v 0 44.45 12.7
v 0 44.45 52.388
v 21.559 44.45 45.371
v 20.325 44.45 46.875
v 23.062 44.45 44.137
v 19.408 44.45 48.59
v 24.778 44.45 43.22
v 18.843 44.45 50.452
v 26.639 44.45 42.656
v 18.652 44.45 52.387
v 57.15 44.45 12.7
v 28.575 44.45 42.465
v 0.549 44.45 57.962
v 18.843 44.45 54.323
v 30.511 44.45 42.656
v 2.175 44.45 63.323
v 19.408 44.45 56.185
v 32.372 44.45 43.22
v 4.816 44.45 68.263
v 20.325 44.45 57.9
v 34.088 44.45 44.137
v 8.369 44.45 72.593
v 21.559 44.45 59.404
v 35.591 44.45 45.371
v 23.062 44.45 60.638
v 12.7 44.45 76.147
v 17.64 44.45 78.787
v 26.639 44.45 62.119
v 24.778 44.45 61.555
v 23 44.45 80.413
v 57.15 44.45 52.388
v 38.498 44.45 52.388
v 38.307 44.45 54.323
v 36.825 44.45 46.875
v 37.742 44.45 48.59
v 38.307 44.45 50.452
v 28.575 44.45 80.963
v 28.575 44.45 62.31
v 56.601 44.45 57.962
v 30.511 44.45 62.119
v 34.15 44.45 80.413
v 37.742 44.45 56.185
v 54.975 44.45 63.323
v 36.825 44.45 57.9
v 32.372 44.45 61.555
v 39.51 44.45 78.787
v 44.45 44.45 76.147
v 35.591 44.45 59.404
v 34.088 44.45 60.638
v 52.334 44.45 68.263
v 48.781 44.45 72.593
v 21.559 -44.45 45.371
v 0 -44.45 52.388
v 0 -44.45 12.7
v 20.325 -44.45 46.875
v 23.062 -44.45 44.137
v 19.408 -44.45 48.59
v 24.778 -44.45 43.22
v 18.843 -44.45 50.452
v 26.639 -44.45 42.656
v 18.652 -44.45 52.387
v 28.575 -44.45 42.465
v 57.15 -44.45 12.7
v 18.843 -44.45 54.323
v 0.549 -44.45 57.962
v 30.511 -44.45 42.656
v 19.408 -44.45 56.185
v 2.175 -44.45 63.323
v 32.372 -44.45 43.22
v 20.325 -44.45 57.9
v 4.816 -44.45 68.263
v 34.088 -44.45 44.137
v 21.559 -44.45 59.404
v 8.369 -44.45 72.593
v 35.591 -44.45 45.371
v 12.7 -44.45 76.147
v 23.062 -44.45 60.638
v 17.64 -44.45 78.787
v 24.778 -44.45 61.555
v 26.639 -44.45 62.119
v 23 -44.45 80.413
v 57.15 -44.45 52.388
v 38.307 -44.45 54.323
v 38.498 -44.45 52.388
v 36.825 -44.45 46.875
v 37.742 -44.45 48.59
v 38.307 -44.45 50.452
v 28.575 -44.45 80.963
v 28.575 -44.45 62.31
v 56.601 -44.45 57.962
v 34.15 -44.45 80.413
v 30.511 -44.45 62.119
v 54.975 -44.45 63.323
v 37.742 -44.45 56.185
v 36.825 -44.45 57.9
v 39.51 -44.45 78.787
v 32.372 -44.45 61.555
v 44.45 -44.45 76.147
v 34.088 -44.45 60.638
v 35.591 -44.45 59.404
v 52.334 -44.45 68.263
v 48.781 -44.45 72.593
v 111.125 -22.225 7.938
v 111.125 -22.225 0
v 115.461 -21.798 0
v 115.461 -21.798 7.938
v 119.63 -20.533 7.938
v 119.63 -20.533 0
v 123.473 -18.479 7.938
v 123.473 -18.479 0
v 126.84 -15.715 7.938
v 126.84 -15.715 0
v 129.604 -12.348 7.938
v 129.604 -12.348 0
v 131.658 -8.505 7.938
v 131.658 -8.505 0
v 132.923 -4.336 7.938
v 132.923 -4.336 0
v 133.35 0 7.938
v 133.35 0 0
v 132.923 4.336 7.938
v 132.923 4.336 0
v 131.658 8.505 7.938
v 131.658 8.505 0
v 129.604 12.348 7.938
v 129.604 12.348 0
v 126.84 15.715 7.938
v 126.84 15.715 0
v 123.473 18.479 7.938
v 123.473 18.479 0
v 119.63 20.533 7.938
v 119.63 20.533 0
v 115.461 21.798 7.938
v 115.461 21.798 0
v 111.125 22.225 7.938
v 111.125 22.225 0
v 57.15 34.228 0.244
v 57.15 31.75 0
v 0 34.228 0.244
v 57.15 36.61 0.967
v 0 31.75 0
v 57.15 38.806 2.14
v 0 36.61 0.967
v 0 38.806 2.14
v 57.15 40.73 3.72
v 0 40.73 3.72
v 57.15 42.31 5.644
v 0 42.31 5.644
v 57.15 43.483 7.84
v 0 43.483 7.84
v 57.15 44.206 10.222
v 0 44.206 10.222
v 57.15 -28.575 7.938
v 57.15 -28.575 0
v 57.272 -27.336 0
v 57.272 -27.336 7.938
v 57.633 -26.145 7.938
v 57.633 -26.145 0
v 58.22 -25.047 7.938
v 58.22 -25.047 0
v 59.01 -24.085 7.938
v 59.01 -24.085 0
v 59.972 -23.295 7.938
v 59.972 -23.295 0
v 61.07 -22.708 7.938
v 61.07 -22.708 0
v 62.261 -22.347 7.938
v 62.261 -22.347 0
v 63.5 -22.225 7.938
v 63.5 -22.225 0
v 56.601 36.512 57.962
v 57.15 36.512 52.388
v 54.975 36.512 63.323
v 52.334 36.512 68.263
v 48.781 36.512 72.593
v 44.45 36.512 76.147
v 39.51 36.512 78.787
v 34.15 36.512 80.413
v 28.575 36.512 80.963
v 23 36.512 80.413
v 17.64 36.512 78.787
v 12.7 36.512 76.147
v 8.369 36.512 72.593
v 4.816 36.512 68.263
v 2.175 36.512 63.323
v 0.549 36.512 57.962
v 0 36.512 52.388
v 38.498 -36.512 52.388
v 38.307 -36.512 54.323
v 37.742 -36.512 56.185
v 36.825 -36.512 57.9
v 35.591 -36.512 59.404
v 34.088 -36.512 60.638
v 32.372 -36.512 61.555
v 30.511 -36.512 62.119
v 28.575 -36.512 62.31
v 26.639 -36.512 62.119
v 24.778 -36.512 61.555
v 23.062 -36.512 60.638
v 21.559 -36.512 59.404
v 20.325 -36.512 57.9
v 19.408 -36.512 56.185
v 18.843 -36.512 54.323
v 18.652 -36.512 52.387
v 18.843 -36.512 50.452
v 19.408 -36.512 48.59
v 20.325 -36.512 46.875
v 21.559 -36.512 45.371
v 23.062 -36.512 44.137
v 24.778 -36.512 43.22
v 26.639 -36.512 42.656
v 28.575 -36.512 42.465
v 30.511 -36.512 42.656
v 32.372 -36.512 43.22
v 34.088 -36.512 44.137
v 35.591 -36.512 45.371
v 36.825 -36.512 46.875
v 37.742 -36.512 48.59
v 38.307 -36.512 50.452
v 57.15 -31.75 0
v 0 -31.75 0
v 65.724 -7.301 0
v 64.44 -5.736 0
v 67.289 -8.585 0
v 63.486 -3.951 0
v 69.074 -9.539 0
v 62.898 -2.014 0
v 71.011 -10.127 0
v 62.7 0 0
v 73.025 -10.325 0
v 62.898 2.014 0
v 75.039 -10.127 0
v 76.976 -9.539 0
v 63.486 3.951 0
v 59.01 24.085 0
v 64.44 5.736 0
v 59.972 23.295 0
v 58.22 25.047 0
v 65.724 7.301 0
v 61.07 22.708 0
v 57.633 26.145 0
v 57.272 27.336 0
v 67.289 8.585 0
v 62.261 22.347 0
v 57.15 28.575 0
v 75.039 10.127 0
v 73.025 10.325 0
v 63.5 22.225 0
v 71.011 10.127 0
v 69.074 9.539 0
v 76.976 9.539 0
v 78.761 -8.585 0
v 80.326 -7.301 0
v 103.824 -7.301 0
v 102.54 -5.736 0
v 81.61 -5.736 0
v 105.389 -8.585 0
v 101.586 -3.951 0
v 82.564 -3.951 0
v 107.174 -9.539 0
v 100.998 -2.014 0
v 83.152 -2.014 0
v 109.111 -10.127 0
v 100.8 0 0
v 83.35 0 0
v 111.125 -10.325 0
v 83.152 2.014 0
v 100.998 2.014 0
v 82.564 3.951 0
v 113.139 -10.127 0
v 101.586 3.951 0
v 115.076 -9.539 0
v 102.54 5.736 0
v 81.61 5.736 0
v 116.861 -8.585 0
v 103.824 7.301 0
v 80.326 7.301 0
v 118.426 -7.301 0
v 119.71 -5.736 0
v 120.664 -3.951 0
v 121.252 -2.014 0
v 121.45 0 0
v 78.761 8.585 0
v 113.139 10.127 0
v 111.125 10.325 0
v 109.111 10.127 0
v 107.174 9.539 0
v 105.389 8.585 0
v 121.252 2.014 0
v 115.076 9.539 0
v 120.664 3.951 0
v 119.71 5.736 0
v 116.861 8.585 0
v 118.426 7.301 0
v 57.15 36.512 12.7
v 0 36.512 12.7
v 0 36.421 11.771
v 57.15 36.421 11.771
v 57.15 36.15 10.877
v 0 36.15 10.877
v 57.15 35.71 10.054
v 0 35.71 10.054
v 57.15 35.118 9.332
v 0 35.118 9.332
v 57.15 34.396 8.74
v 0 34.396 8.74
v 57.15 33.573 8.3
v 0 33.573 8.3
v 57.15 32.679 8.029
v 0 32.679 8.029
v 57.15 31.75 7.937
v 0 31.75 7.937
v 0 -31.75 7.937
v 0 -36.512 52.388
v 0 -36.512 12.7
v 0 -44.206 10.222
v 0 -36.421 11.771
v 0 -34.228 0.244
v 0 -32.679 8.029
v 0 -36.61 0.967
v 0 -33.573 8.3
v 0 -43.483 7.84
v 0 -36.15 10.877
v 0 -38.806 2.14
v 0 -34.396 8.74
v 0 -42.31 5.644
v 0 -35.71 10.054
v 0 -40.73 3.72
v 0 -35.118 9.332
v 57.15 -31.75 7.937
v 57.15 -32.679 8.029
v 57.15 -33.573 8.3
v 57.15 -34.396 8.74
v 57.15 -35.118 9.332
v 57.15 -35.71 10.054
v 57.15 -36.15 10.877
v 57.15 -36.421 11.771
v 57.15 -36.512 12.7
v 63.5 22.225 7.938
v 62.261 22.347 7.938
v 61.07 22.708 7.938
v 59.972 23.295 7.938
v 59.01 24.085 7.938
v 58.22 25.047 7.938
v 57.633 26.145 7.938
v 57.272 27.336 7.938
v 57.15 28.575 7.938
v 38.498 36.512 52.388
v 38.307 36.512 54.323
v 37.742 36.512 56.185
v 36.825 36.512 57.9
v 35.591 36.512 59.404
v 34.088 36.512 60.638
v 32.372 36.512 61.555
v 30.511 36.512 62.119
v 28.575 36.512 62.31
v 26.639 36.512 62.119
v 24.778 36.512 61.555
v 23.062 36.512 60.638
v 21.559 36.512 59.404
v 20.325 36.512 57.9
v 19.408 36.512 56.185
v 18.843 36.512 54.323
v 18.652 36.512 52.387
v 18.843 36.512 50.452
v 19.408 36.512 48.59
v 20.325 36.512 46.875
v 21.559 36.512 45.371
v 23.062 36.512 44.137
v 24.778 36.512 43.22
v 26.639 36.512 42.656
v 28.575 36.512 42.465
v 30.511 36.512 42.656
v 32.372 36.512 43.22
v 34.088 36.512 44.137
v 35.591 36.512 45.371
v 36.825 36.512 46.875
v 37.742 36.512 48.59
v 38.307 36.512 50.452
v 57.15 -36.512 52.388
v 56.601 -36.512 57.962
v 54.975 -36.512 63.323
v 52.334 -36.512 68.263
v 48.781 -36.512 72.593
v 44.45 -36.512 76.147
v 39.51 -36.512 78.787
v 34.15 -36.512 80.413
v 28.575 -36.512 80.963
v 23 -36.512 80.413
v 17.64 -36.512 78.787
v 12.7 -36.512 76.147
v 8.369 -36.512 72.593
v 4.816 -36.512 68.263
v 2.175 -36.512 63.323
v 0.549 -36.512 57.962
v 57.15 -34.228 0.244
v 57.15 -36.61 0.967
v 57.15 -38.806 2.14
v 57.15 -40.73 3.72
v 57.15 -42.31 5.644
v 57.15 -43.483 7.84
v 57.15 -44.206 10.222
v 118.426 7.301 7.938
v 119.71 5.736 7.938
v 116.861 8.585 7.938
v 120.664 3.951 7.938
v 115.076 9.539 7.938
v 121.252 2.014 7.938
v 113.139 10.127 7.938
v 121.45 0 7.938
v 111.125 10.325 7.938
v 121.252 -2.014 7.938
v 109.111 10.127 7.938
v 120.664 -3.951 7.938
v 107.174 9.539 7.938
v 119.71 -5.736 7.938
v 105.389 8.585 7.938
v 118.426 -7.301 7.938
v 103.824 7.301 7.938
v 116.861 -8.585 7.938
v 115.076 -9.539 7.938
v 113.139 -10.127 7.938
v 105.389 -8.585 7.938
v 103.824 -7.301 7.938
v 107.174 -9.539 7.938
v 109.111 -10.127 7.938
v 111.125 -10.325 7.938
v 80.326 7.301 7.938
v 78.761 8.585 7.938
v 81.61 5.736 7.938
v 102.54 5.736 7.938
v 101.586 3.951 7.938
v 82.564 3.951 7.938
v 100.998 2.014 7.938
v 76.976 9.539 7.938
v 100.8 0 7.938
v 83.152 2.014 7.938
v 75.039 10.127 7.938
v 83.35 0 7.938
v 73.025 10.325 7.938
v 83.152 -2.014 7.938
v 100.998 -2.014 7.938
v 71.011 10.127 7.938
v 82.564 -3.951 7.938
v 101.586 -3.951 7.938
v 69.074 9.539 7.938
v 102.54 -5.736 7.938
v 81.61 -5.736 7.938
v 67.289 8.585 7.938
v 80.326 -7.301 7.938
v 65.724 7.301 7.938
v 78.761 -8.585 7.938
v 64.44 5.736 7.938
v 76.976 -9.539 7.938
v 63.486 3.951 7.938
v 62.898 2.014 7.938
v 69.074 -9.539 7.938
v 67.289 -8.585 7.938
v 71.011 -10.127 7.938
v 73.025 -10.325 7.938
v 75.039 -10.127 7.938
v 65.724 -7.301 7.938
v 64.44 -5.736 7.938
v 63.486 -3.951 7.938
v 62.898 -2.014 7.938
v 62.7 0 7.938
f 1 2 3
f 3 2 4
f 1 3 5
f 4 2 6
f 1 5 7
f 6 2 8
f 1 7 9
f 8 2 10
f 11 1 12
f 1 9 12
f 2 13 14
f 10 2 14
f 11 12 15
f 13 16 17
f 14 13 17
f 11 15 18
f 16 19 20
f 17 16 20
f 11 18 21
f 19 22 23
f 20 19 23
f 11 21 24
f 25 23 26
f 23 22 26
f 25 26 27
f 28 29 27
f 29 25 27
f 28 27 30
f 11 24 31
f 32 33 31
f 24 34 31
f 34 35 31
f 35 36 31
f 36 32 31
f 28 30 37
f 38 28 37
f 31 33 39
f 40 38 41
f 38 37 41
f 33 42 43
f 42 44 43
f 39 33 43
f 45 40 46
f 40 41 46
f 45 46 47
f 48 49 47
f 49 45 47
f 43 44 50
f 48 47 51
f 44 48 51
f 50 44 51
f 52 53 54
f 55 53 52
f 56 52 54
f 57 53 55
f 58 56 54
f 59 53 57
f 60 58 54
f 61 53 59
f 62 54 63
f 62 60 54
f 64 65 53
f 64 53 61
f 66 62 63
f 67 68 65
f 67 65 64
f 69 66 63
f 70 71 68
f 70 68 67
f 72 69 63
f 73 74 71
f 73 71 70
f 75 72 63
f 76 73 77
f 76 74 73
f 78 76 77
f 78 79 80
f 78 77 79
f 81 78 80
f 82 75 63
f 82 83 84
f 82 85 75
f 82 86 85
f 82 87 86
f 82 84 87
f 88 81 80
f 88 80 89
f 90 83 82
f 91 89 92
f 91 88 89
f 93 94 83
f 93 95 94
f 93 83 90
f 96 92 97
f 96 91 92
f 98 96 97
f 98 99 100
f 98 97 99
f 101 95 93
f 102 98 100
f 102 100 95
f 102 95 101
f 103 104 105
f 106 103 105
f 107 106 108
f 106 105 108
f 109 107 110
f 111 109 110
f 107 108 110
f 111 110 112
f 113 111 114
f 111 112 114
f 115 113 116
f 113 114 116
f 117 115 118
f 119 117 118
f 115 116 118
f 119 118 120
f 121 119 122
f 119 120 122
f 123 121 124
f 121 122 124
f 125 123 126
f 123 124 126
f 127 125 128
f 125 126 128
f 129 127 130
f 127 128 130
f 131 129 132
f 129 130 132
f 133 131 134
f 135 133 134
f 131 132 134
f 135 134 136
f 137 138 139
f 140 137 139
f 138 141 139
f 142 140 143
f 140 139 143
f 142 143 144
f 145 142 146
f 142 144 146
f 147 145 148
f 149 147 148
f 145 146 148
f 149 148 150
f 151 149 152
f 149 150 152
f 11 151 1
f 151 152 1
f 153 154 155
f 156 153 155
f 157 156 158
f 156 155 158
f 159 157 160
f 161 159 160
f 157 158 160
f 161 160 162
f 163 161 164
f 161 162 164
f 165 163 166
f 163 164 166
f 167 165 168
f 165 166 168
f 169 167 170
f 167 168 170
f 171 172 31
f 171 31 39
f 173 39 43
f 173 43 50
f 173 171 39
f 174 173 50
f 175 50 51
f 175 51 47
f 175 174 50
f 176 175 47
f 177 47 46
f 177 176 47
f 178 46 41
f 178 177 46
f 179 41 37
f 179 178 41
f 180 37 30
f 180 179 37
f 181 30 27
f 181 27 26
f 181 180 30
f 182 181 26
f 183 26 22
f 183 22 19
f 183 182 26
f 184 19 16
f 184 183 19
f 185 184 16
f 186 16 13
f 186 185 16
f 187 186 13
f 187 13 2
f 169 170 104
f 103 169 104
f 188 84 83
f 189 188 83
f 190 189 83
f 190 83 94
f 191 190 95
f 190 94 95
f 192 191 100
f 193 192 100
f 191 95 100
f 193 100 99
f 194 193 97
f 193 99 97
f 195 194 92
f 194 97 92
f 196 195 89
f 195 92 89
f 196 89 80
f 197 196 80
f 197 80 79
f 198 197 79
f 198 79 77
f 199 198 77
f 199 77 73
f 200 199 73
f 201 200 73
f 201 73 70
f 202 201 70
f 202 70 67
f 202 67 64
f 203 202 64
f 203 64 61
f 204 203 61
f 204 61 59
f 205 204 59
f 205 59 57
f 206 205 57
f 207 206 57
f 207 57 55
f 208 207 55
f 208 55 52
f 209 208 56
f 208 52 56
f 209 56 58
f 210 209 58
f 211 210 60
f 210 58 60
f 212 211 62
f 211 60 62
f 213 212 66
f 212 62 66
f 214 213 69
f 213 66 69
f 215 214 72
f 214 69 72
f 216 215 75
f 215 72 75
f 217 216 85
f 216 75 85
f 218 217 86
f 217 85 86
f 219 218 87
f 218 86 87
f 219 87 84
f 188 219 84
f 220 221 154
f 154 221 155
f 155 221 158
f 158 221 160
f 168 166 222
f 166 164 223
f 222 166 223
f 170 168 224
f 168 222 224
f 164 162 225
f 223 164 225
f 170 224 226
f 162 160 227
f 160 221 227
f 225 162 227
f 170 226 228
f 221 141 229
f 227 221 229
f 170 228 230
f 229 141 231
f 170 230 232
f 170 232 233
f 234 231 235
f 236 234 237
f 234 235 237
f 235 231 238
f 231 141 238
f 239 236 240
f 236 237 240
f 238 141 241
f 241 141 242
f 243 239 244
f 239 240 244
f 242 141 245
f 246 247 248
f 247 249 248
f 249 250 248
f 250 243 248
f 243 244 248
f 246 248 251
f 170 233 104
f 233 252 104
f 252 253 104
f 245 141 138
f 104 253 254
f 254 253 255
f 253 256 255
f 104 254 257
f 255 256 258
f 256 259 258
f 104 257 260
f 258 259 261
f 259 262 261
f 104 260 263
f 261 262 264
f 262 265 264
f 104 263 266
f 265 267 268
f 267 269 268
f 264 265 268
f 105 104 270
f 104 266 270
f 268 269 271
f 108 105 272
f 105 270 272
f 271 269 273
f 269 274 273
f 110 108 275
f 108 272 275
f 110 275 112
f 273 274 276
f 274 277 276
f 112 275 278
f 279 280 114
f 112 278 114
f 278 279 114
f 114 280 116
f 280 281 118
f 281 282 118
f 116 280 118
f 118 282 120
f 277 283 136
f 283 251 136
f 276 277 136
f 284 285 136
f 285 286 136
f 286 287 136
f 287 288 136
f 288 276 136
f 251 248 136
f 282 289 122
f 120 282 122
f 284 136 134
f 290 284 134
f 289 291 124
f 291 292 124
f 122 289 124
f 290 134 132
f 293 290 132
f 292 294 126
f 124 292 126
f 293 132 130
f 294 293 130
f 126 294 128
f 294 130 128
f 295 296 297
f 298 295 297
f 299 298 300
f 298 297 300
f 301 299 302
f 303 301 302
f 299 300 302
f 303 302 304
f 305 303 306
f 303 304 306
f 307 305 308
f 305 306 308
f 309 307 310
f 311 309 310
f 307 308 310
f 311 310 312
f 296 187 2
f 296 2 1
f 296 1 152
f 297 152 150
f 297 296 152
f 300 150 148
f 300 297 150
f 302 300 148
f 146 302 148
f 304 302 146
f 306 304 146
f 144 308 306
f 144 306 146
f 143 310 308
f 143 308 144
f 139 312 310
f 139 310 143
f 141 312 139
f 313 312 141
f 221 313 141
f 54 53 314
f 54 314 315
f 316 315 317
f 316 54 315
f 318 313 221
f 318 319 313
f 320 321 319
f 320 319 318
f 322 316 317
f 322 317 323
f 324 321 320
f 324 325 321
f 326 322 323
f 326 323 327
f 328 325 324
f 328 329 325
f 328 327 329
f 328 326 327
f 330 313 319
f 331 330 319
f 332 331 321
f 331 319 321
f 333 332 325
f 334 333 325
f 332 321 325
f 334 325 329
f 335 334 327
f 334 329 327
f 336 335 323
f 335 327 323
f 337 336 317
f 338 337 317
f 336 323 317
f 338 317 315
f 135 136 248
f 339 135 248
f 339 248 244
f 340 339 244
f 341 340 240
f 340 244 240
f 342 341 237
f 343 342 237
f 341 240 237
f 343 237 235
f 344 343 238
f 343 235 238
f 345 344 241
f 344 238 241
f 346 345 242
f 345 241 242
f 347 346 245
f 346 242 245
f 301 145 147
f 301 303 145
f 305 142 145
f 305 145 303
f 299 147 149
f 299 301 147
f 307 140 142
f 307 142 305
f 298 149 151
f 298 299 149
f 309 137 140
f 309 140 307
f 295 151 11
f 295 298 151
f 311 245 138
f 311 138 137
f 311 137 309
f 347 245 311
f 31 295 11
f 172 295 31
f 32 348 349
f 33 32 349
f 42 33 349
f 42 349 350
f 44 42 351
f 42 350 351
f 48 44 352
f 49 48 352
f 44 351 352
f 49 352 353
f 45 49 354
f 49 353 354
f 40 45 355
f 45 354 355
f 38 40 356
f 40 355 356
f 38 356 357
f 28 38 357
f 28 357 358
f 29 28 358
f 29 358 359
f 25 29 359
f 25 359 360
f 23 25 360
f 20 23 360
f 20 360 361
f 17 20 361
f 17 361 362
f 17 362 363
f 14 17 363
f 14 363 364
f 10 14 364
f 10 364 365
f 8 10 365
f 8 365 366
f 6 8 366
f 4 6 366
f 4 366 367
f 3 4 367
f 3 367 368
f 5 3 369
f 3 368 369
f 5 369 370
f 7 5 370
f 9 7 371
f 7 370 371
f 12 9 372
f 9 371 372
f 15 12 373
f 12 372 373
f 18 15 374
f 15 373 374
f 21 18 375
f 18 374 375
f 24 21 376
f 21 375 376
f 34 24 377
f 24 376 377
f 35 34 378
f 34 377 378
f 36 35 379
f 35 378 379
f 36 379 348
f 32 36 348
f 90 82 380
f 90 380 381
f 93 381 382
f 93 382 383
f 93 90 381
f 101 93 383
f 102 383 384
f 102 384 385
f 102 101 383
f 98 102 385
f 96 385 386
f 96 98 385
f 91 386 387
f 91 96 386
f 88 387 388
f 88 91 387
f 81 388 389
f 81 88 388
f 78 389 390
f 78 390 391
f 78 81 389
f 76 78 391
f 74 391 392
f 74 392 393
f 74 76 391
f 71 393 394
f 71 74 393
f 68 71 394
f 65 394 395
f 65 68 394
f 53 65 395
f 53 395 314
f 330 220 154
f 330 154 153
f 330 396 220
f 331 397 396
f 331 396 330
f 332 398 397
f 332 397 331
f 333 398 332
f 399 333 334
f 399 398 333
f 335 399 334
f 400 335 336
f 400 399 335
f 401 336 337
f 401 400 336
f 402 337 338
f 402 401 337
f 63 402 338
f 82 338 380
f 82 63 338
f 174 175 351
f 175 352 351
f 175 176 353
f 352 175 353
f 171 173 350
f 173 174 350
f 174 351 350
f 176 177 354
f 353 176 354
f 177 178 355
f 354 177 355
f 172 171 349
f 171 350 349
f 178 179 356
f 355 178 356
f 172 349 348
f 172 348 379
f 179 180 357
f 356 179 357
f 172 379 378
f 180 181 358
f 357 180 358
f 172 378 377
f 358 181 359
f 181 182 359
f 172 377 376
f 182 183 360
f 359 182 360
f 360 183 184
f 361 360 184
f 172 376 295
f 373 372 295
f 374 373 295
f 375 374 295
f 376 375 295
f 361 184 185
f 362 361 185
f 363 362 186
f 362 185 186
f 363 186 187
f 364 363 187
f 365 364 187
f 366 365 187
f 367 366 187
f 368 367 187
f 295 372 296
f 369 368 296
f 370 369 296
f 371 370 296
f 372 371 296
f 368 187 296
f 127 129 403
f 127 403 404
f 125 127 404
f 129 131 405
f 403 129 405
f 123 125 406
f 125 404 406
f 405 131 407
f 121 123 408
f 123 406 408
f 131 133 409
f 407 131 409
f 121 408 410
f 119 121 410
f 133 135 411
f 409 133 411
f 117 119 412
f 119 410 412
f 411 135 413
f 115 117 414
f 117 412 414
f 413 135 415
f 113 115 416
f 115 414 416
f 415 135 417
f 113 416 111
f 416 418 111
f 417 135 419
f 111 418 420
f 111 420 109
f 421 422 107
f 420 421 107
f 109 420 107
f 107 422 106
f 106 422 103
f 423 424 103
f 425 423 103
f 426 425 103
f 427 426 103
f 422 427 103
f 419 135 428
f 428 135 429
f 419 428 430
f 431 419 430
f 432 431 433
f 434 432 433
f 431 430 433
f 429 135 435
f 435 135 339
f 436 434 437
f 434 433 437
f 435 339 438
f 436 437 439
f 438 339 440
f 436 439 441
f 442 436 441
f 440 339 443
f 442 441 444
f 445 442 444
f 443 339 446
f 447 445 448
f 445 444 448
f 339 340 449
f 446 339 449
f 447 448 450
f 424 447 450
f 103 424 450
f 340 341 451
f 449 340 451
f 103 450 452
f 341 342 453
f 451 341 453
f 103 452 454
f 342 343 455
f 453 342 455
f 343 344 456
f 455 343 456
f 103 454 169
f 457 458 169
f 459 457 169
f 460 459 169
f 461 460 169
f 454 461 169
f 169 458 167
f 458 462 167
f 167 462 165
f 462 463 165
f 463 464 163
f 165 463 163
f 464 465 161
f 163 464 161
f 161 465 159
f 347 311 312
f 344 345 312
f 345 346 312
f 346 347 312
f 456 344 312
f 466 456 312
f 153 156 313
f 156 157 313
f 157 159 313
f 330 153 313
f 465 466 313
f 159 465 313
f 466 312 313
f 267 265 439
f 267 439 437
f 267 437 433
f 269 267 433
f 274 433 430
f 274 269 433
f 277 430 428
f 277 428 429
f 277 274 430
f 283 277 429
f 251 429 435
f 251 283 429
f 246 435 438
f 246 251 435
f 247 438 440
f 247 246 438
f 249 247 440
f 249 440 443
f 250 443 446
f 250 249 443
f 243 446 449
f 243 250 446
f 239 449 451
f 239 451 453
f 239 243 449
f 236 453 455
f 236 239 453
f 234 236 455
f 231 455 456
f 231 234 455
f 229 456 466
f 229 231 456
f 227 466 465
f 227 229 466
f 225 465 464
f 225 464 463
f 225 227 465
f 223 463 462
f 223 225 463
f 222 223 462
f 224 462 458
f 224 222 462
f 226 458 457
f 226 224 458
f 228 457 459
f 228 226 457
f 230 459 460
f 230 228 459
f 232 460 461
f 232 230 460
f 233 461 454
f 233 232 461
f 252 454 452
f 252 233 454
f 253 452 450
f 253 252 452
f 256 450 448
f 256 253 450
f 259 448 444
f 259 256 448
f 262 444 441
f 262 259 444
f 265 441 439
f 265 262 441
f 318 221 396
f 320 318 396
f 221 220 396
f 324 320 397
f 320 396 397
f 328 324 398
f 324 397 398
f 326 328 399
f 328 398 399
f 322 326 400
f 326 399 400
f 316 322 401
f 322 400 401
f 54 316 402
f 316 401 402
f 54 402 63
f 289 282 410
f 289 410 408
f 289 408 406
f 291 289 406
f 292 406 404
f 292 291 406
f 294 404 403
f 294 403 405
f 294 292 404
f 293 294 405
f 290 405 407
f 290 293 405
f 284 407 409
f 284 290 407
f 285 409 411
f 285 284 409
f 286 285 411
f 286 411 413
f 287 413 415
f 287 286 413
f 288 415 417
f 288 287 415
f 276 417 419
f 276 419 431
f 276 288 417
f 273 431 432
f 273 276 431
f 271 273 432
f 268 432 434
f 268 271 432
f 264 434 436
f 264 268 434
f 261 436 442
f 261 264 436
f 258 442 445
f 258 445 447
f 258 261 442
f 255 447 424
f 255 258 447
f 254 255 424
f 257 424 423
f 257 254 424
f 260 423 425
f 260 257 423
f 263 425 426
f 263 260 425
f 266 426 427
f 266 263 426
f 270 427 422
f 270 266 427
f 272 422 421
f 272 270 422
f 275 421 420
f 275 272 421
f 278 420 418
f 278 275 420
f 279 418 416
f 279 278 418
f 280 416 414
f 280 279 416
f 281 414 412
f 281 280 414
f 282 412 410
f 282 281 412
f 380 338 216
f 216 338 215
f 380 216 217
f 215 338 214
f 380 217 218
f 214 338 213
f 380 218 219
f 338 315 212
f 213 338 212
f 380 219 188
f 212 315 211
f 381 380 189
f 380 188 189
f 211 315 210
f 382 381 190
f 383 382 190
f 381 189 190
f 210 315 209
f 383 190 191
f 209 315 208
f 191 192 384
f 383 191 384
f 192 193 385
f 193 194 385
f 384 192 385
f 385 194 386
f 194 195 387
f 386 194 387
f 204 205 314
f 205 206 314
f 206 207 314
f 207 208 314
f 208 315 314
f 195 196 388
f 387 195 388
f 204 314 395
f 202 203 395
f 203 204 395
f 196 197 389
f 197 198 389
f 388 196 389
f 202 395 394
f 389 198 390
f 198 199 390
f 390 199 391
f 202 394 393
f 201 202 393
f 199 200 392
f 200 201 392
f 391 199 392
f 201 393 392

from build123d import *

# Parameters (mm, degrees)
F0_R     = 10.3251
F1_DEPTH = 7.9375
F2_R     = 9.92251
F3_DEPTH = 88.9
F5_DEPTH = 57.15
F6_R     = 12.7
F7_R     = 12.7


with BuildPart() as f1:
    # F0 (on Top) → F1 (new body)
    with BuildSketch(Plane.XY):
        with BuildLine():
            Line((0, 44.45), (0, -44.45))
            Line((0, -44.45), (57.15, -44.45))
            Line((57.15, -44.45), (57.15, -28.575))
            ThreePointArc((57.15, -28.575), (59.009872, -24.084872), (63.5, -22.225))
            Line((63.5, -22.225), (111.125, -22.225))
            ThreePointArc((111.125, -22.225), (133.35, 0), (111.125, 22.225))
            Line((111.125, 22.225), (63.5, 22.225))
            ThreePointArc((63.5, 22.225), (59.009872, 24.084872), (57.15, 28.575))
            Line((57.15, 28.575), (57.15, 44.45))
            Line((57.15, 44.45), (0, 44.45))
        make_face()
        with Locations((73.025, 0)):
            Circle(F0_R, mode=Mode.SUBTRACT)
        with Locations((111.125, 0)):
            Circle(F0_R, mode=Mode.SUBTRACT)
    extrude(amount=F1_DEPTH)

    # F2 (on face) → F3 (join)
    with BuildSketch(Plane.XZ.offset(44.45)):
        with BuildLine():
            Line((0, 52.3875), (0, 7.9375))
            Line((0, 7.9375), (57.15, 7.9375))
            Line((57.15, 7.9375), (57.15, 52.3875))
            ThreePointArc((57.15, 52.3875), (28.575, 80.9625), (0, 52.3875))
        make_face()
        with Locations((28.575, 52.3875)):
            Circle(F2_R, mode=Mode.SUBTRACT)
    extrude(amount=-F3_DEPTH)

    # F4 (on face) → F5 (cut)
    with BuildSketch(Plane(origin=(0, 0, 0), x_dir=(0, -1, 0), z_dir=(-1, 0, 0))):
        with BuildLine():
            ThreePointArc((-36.5125, 12.7), (-35.117596, 9.332404), (-31.75, 7.9375))
            Line((-31.75, 7.9375), (31.75, 7.9375))
            ThreePointArc((31.75, 7.9375), (35.117596, 9.332404), (36.5125, 12.7))
            Line((36.5125, 12.7), (36.5125, 84.1375))
            Line((36.5125, 84.1375), (-36.5125, 84.1375))
            Line((-36.5125, 84.1375), (-36.5125, 12.7))
        make_face()
    extrude(amount=-F5_DEPTH, mode=Mode.SUBTRACT)

    # F6
    f6_edges = [f1.edges().sort_by_distance(p)[0] for p in [
        (28.575, 44.45, 0),
    ]]
    fillet(f6_edges, radius=F6_R)

    # F7
    f7_edges = [f1.edges().sort_by_distance(p)[0] for p in [
        (28.575, -44.45, 0),
    ]]
    fillet(f7_edges, radius=F7_R)


solid = f1.part
